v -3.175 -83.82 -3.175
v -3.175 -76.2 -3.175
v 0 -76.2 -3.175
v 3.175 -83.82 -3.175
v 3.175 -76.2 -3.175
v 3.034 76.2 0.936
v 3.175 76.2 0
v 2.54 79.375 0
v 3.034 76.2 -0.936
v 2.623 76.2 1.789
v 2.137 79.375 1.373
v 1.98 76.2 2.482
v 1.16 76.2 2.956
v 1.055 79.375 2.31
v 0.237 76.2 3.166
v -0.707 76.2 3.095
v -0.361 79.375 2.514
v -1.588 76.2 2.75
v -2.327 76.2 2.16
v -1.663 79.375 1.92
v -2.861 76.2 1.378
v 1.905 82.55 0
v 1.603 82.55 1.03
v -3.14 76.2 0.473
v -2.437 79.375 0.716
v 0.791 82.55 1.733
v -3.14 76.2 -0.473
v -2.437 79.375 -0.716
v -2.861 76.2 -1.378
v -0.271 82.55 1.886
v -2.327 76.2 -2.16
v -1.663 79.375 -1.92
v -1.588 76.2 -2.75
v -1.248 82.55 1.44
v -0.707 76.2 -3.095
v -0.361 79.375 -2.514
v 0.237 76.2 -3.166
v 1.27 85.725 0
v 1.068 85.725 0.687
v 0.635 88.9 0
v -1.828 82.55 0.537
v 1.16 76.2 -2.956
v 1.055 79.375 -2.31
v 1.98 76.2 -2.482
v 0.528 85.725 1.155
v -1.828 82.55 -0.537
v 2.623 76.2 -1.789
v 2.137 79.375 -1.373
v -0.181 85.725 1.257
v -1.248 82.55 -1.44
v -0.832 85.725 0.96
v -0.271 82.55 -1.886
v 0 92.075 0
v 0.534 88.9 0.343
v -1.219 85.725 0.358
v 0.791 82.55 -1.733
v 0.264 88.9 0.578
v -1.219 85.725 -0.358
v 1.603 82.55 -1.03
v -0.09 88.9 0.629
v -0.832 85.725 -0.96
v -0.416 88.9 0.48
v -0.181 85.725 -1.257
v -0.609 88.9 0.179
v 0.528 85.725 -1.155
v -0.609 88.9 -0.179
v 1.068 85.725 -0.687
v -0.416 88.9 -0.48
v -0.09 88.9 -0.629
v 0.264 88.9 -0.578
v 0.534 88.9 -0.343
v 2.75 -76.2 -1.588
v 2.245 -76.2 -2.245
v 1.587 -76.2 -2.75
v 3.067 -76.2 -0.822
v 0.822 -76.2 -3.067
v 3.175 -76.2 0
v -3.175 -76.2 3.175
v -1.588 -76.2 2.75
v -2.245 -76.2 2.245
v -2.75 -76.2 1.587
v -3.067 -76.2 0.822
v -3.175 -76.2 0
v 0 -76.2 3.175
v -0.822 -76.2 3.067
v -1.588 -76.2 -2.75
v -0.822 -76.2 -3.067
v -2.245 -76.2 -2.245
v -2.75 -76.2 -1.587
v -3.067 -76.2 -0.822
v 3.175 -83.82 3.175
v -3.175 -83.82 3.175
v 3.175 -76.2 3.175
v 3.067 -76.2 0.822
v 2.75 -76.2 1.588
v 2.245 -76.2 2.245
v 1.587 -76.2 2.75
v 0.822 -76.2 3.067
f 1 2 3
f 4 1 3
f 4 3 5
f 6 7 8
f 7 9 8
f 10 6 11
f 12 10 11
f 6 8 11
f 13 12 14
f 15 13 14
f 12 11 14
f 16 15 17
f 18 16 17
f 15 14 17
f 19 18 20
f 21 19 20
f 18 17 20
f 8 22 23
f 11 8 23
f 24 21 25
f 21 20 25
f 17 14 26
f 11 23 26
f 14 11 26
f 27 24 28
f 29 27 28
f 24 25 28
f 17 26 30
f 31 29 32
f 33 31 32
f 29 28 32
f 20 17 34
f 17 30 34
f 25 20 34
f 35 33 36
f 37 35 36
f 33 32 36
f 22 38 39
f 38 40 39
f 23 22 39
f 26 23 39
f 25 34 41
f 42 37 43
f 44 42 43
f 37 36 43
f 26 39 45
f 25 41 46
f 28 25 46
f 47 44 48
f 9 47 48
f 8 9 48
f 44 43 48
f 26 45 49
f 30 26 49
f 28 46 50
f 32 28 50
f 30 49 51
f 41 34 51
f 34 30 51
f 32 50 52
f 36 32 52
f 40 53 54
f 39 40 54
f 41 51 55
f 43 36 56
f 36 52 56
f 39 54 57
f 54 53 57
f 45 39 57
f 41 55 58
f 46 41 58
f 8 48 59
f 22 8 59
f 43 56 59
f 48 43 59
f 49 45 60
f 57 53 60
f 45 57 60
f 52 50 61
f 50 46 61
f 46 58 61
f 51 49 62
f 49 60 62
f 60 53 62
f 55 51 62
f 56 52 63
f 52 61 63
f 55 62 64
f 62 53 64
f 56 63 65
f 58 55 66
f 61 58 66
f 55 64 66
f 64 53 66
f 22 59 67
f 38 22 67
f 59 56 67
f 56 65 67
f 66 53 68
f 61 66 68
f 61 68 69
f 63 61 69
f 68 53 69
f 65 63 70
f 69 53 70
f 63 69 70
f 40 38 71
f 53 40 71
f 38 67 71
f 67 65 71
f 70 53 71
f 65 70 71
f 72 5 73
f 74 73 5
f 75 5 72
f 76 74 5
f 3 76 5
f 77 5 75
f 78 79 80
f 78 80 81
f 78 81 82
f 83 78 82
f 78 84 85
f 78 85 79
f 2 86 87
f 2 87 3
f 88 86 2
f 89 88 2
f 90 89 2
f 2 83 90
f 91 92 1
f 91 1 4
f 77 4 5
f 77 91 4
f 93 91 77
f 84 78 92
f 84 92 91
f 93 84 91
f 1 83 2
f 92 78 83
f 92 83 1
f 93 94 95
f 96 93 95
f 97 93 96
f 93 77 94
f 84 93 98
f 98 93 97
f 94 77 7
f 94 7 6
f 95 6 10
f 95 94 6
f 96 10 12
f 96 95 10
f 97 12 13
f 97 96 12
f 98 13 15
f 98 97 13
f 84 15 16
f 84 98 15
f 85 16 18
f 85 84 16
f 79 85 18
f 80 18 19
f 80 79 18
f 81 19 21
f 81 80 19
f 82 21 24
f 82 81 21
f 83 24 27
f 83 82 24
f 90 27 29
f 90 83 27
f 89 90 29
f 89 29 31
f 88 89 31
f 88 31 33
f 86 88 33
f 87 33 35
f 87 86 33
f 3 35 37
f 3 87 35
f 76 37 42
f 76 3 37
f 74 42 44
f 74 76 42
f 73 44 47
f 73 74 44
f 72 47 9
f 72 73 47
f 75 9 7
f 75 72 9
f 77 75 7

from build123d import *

# Parameters (mm, degrees)
F0_R     = 3.175
F1_DEPTH = 76.2
F5_DEPTH = 3.175


with BuildPart() as f1:
    # F0 (on Front) → F1 (new body, symmetric)
    with BuildSketch(Plane.XZ):
        Circle(F0_R)
    extrude(amount=F1_DEPTH, both=True)

    # F2 (on Top) → F3 (revolve)
    with BuildSketch(Plane.XY):
        Polygon((0, 92.075), (0, 76.2), (3.175, 76.2), align=None)
    revolve(axis=Axis((0, 84.1375, 0), (0, -1, 0)))

    # F4 (on Top) → F5 (join, symmetric)
    with BuildSketch(Plane.XY):
        Polygon((3.175, -76.2), (0, -76.2), (-3.175, -76.2), (-3.175, -83.82), (3.175, -83.82), align=None)
    extrude(amount=F5_DEPTH, both=True)


solid = f1.part
